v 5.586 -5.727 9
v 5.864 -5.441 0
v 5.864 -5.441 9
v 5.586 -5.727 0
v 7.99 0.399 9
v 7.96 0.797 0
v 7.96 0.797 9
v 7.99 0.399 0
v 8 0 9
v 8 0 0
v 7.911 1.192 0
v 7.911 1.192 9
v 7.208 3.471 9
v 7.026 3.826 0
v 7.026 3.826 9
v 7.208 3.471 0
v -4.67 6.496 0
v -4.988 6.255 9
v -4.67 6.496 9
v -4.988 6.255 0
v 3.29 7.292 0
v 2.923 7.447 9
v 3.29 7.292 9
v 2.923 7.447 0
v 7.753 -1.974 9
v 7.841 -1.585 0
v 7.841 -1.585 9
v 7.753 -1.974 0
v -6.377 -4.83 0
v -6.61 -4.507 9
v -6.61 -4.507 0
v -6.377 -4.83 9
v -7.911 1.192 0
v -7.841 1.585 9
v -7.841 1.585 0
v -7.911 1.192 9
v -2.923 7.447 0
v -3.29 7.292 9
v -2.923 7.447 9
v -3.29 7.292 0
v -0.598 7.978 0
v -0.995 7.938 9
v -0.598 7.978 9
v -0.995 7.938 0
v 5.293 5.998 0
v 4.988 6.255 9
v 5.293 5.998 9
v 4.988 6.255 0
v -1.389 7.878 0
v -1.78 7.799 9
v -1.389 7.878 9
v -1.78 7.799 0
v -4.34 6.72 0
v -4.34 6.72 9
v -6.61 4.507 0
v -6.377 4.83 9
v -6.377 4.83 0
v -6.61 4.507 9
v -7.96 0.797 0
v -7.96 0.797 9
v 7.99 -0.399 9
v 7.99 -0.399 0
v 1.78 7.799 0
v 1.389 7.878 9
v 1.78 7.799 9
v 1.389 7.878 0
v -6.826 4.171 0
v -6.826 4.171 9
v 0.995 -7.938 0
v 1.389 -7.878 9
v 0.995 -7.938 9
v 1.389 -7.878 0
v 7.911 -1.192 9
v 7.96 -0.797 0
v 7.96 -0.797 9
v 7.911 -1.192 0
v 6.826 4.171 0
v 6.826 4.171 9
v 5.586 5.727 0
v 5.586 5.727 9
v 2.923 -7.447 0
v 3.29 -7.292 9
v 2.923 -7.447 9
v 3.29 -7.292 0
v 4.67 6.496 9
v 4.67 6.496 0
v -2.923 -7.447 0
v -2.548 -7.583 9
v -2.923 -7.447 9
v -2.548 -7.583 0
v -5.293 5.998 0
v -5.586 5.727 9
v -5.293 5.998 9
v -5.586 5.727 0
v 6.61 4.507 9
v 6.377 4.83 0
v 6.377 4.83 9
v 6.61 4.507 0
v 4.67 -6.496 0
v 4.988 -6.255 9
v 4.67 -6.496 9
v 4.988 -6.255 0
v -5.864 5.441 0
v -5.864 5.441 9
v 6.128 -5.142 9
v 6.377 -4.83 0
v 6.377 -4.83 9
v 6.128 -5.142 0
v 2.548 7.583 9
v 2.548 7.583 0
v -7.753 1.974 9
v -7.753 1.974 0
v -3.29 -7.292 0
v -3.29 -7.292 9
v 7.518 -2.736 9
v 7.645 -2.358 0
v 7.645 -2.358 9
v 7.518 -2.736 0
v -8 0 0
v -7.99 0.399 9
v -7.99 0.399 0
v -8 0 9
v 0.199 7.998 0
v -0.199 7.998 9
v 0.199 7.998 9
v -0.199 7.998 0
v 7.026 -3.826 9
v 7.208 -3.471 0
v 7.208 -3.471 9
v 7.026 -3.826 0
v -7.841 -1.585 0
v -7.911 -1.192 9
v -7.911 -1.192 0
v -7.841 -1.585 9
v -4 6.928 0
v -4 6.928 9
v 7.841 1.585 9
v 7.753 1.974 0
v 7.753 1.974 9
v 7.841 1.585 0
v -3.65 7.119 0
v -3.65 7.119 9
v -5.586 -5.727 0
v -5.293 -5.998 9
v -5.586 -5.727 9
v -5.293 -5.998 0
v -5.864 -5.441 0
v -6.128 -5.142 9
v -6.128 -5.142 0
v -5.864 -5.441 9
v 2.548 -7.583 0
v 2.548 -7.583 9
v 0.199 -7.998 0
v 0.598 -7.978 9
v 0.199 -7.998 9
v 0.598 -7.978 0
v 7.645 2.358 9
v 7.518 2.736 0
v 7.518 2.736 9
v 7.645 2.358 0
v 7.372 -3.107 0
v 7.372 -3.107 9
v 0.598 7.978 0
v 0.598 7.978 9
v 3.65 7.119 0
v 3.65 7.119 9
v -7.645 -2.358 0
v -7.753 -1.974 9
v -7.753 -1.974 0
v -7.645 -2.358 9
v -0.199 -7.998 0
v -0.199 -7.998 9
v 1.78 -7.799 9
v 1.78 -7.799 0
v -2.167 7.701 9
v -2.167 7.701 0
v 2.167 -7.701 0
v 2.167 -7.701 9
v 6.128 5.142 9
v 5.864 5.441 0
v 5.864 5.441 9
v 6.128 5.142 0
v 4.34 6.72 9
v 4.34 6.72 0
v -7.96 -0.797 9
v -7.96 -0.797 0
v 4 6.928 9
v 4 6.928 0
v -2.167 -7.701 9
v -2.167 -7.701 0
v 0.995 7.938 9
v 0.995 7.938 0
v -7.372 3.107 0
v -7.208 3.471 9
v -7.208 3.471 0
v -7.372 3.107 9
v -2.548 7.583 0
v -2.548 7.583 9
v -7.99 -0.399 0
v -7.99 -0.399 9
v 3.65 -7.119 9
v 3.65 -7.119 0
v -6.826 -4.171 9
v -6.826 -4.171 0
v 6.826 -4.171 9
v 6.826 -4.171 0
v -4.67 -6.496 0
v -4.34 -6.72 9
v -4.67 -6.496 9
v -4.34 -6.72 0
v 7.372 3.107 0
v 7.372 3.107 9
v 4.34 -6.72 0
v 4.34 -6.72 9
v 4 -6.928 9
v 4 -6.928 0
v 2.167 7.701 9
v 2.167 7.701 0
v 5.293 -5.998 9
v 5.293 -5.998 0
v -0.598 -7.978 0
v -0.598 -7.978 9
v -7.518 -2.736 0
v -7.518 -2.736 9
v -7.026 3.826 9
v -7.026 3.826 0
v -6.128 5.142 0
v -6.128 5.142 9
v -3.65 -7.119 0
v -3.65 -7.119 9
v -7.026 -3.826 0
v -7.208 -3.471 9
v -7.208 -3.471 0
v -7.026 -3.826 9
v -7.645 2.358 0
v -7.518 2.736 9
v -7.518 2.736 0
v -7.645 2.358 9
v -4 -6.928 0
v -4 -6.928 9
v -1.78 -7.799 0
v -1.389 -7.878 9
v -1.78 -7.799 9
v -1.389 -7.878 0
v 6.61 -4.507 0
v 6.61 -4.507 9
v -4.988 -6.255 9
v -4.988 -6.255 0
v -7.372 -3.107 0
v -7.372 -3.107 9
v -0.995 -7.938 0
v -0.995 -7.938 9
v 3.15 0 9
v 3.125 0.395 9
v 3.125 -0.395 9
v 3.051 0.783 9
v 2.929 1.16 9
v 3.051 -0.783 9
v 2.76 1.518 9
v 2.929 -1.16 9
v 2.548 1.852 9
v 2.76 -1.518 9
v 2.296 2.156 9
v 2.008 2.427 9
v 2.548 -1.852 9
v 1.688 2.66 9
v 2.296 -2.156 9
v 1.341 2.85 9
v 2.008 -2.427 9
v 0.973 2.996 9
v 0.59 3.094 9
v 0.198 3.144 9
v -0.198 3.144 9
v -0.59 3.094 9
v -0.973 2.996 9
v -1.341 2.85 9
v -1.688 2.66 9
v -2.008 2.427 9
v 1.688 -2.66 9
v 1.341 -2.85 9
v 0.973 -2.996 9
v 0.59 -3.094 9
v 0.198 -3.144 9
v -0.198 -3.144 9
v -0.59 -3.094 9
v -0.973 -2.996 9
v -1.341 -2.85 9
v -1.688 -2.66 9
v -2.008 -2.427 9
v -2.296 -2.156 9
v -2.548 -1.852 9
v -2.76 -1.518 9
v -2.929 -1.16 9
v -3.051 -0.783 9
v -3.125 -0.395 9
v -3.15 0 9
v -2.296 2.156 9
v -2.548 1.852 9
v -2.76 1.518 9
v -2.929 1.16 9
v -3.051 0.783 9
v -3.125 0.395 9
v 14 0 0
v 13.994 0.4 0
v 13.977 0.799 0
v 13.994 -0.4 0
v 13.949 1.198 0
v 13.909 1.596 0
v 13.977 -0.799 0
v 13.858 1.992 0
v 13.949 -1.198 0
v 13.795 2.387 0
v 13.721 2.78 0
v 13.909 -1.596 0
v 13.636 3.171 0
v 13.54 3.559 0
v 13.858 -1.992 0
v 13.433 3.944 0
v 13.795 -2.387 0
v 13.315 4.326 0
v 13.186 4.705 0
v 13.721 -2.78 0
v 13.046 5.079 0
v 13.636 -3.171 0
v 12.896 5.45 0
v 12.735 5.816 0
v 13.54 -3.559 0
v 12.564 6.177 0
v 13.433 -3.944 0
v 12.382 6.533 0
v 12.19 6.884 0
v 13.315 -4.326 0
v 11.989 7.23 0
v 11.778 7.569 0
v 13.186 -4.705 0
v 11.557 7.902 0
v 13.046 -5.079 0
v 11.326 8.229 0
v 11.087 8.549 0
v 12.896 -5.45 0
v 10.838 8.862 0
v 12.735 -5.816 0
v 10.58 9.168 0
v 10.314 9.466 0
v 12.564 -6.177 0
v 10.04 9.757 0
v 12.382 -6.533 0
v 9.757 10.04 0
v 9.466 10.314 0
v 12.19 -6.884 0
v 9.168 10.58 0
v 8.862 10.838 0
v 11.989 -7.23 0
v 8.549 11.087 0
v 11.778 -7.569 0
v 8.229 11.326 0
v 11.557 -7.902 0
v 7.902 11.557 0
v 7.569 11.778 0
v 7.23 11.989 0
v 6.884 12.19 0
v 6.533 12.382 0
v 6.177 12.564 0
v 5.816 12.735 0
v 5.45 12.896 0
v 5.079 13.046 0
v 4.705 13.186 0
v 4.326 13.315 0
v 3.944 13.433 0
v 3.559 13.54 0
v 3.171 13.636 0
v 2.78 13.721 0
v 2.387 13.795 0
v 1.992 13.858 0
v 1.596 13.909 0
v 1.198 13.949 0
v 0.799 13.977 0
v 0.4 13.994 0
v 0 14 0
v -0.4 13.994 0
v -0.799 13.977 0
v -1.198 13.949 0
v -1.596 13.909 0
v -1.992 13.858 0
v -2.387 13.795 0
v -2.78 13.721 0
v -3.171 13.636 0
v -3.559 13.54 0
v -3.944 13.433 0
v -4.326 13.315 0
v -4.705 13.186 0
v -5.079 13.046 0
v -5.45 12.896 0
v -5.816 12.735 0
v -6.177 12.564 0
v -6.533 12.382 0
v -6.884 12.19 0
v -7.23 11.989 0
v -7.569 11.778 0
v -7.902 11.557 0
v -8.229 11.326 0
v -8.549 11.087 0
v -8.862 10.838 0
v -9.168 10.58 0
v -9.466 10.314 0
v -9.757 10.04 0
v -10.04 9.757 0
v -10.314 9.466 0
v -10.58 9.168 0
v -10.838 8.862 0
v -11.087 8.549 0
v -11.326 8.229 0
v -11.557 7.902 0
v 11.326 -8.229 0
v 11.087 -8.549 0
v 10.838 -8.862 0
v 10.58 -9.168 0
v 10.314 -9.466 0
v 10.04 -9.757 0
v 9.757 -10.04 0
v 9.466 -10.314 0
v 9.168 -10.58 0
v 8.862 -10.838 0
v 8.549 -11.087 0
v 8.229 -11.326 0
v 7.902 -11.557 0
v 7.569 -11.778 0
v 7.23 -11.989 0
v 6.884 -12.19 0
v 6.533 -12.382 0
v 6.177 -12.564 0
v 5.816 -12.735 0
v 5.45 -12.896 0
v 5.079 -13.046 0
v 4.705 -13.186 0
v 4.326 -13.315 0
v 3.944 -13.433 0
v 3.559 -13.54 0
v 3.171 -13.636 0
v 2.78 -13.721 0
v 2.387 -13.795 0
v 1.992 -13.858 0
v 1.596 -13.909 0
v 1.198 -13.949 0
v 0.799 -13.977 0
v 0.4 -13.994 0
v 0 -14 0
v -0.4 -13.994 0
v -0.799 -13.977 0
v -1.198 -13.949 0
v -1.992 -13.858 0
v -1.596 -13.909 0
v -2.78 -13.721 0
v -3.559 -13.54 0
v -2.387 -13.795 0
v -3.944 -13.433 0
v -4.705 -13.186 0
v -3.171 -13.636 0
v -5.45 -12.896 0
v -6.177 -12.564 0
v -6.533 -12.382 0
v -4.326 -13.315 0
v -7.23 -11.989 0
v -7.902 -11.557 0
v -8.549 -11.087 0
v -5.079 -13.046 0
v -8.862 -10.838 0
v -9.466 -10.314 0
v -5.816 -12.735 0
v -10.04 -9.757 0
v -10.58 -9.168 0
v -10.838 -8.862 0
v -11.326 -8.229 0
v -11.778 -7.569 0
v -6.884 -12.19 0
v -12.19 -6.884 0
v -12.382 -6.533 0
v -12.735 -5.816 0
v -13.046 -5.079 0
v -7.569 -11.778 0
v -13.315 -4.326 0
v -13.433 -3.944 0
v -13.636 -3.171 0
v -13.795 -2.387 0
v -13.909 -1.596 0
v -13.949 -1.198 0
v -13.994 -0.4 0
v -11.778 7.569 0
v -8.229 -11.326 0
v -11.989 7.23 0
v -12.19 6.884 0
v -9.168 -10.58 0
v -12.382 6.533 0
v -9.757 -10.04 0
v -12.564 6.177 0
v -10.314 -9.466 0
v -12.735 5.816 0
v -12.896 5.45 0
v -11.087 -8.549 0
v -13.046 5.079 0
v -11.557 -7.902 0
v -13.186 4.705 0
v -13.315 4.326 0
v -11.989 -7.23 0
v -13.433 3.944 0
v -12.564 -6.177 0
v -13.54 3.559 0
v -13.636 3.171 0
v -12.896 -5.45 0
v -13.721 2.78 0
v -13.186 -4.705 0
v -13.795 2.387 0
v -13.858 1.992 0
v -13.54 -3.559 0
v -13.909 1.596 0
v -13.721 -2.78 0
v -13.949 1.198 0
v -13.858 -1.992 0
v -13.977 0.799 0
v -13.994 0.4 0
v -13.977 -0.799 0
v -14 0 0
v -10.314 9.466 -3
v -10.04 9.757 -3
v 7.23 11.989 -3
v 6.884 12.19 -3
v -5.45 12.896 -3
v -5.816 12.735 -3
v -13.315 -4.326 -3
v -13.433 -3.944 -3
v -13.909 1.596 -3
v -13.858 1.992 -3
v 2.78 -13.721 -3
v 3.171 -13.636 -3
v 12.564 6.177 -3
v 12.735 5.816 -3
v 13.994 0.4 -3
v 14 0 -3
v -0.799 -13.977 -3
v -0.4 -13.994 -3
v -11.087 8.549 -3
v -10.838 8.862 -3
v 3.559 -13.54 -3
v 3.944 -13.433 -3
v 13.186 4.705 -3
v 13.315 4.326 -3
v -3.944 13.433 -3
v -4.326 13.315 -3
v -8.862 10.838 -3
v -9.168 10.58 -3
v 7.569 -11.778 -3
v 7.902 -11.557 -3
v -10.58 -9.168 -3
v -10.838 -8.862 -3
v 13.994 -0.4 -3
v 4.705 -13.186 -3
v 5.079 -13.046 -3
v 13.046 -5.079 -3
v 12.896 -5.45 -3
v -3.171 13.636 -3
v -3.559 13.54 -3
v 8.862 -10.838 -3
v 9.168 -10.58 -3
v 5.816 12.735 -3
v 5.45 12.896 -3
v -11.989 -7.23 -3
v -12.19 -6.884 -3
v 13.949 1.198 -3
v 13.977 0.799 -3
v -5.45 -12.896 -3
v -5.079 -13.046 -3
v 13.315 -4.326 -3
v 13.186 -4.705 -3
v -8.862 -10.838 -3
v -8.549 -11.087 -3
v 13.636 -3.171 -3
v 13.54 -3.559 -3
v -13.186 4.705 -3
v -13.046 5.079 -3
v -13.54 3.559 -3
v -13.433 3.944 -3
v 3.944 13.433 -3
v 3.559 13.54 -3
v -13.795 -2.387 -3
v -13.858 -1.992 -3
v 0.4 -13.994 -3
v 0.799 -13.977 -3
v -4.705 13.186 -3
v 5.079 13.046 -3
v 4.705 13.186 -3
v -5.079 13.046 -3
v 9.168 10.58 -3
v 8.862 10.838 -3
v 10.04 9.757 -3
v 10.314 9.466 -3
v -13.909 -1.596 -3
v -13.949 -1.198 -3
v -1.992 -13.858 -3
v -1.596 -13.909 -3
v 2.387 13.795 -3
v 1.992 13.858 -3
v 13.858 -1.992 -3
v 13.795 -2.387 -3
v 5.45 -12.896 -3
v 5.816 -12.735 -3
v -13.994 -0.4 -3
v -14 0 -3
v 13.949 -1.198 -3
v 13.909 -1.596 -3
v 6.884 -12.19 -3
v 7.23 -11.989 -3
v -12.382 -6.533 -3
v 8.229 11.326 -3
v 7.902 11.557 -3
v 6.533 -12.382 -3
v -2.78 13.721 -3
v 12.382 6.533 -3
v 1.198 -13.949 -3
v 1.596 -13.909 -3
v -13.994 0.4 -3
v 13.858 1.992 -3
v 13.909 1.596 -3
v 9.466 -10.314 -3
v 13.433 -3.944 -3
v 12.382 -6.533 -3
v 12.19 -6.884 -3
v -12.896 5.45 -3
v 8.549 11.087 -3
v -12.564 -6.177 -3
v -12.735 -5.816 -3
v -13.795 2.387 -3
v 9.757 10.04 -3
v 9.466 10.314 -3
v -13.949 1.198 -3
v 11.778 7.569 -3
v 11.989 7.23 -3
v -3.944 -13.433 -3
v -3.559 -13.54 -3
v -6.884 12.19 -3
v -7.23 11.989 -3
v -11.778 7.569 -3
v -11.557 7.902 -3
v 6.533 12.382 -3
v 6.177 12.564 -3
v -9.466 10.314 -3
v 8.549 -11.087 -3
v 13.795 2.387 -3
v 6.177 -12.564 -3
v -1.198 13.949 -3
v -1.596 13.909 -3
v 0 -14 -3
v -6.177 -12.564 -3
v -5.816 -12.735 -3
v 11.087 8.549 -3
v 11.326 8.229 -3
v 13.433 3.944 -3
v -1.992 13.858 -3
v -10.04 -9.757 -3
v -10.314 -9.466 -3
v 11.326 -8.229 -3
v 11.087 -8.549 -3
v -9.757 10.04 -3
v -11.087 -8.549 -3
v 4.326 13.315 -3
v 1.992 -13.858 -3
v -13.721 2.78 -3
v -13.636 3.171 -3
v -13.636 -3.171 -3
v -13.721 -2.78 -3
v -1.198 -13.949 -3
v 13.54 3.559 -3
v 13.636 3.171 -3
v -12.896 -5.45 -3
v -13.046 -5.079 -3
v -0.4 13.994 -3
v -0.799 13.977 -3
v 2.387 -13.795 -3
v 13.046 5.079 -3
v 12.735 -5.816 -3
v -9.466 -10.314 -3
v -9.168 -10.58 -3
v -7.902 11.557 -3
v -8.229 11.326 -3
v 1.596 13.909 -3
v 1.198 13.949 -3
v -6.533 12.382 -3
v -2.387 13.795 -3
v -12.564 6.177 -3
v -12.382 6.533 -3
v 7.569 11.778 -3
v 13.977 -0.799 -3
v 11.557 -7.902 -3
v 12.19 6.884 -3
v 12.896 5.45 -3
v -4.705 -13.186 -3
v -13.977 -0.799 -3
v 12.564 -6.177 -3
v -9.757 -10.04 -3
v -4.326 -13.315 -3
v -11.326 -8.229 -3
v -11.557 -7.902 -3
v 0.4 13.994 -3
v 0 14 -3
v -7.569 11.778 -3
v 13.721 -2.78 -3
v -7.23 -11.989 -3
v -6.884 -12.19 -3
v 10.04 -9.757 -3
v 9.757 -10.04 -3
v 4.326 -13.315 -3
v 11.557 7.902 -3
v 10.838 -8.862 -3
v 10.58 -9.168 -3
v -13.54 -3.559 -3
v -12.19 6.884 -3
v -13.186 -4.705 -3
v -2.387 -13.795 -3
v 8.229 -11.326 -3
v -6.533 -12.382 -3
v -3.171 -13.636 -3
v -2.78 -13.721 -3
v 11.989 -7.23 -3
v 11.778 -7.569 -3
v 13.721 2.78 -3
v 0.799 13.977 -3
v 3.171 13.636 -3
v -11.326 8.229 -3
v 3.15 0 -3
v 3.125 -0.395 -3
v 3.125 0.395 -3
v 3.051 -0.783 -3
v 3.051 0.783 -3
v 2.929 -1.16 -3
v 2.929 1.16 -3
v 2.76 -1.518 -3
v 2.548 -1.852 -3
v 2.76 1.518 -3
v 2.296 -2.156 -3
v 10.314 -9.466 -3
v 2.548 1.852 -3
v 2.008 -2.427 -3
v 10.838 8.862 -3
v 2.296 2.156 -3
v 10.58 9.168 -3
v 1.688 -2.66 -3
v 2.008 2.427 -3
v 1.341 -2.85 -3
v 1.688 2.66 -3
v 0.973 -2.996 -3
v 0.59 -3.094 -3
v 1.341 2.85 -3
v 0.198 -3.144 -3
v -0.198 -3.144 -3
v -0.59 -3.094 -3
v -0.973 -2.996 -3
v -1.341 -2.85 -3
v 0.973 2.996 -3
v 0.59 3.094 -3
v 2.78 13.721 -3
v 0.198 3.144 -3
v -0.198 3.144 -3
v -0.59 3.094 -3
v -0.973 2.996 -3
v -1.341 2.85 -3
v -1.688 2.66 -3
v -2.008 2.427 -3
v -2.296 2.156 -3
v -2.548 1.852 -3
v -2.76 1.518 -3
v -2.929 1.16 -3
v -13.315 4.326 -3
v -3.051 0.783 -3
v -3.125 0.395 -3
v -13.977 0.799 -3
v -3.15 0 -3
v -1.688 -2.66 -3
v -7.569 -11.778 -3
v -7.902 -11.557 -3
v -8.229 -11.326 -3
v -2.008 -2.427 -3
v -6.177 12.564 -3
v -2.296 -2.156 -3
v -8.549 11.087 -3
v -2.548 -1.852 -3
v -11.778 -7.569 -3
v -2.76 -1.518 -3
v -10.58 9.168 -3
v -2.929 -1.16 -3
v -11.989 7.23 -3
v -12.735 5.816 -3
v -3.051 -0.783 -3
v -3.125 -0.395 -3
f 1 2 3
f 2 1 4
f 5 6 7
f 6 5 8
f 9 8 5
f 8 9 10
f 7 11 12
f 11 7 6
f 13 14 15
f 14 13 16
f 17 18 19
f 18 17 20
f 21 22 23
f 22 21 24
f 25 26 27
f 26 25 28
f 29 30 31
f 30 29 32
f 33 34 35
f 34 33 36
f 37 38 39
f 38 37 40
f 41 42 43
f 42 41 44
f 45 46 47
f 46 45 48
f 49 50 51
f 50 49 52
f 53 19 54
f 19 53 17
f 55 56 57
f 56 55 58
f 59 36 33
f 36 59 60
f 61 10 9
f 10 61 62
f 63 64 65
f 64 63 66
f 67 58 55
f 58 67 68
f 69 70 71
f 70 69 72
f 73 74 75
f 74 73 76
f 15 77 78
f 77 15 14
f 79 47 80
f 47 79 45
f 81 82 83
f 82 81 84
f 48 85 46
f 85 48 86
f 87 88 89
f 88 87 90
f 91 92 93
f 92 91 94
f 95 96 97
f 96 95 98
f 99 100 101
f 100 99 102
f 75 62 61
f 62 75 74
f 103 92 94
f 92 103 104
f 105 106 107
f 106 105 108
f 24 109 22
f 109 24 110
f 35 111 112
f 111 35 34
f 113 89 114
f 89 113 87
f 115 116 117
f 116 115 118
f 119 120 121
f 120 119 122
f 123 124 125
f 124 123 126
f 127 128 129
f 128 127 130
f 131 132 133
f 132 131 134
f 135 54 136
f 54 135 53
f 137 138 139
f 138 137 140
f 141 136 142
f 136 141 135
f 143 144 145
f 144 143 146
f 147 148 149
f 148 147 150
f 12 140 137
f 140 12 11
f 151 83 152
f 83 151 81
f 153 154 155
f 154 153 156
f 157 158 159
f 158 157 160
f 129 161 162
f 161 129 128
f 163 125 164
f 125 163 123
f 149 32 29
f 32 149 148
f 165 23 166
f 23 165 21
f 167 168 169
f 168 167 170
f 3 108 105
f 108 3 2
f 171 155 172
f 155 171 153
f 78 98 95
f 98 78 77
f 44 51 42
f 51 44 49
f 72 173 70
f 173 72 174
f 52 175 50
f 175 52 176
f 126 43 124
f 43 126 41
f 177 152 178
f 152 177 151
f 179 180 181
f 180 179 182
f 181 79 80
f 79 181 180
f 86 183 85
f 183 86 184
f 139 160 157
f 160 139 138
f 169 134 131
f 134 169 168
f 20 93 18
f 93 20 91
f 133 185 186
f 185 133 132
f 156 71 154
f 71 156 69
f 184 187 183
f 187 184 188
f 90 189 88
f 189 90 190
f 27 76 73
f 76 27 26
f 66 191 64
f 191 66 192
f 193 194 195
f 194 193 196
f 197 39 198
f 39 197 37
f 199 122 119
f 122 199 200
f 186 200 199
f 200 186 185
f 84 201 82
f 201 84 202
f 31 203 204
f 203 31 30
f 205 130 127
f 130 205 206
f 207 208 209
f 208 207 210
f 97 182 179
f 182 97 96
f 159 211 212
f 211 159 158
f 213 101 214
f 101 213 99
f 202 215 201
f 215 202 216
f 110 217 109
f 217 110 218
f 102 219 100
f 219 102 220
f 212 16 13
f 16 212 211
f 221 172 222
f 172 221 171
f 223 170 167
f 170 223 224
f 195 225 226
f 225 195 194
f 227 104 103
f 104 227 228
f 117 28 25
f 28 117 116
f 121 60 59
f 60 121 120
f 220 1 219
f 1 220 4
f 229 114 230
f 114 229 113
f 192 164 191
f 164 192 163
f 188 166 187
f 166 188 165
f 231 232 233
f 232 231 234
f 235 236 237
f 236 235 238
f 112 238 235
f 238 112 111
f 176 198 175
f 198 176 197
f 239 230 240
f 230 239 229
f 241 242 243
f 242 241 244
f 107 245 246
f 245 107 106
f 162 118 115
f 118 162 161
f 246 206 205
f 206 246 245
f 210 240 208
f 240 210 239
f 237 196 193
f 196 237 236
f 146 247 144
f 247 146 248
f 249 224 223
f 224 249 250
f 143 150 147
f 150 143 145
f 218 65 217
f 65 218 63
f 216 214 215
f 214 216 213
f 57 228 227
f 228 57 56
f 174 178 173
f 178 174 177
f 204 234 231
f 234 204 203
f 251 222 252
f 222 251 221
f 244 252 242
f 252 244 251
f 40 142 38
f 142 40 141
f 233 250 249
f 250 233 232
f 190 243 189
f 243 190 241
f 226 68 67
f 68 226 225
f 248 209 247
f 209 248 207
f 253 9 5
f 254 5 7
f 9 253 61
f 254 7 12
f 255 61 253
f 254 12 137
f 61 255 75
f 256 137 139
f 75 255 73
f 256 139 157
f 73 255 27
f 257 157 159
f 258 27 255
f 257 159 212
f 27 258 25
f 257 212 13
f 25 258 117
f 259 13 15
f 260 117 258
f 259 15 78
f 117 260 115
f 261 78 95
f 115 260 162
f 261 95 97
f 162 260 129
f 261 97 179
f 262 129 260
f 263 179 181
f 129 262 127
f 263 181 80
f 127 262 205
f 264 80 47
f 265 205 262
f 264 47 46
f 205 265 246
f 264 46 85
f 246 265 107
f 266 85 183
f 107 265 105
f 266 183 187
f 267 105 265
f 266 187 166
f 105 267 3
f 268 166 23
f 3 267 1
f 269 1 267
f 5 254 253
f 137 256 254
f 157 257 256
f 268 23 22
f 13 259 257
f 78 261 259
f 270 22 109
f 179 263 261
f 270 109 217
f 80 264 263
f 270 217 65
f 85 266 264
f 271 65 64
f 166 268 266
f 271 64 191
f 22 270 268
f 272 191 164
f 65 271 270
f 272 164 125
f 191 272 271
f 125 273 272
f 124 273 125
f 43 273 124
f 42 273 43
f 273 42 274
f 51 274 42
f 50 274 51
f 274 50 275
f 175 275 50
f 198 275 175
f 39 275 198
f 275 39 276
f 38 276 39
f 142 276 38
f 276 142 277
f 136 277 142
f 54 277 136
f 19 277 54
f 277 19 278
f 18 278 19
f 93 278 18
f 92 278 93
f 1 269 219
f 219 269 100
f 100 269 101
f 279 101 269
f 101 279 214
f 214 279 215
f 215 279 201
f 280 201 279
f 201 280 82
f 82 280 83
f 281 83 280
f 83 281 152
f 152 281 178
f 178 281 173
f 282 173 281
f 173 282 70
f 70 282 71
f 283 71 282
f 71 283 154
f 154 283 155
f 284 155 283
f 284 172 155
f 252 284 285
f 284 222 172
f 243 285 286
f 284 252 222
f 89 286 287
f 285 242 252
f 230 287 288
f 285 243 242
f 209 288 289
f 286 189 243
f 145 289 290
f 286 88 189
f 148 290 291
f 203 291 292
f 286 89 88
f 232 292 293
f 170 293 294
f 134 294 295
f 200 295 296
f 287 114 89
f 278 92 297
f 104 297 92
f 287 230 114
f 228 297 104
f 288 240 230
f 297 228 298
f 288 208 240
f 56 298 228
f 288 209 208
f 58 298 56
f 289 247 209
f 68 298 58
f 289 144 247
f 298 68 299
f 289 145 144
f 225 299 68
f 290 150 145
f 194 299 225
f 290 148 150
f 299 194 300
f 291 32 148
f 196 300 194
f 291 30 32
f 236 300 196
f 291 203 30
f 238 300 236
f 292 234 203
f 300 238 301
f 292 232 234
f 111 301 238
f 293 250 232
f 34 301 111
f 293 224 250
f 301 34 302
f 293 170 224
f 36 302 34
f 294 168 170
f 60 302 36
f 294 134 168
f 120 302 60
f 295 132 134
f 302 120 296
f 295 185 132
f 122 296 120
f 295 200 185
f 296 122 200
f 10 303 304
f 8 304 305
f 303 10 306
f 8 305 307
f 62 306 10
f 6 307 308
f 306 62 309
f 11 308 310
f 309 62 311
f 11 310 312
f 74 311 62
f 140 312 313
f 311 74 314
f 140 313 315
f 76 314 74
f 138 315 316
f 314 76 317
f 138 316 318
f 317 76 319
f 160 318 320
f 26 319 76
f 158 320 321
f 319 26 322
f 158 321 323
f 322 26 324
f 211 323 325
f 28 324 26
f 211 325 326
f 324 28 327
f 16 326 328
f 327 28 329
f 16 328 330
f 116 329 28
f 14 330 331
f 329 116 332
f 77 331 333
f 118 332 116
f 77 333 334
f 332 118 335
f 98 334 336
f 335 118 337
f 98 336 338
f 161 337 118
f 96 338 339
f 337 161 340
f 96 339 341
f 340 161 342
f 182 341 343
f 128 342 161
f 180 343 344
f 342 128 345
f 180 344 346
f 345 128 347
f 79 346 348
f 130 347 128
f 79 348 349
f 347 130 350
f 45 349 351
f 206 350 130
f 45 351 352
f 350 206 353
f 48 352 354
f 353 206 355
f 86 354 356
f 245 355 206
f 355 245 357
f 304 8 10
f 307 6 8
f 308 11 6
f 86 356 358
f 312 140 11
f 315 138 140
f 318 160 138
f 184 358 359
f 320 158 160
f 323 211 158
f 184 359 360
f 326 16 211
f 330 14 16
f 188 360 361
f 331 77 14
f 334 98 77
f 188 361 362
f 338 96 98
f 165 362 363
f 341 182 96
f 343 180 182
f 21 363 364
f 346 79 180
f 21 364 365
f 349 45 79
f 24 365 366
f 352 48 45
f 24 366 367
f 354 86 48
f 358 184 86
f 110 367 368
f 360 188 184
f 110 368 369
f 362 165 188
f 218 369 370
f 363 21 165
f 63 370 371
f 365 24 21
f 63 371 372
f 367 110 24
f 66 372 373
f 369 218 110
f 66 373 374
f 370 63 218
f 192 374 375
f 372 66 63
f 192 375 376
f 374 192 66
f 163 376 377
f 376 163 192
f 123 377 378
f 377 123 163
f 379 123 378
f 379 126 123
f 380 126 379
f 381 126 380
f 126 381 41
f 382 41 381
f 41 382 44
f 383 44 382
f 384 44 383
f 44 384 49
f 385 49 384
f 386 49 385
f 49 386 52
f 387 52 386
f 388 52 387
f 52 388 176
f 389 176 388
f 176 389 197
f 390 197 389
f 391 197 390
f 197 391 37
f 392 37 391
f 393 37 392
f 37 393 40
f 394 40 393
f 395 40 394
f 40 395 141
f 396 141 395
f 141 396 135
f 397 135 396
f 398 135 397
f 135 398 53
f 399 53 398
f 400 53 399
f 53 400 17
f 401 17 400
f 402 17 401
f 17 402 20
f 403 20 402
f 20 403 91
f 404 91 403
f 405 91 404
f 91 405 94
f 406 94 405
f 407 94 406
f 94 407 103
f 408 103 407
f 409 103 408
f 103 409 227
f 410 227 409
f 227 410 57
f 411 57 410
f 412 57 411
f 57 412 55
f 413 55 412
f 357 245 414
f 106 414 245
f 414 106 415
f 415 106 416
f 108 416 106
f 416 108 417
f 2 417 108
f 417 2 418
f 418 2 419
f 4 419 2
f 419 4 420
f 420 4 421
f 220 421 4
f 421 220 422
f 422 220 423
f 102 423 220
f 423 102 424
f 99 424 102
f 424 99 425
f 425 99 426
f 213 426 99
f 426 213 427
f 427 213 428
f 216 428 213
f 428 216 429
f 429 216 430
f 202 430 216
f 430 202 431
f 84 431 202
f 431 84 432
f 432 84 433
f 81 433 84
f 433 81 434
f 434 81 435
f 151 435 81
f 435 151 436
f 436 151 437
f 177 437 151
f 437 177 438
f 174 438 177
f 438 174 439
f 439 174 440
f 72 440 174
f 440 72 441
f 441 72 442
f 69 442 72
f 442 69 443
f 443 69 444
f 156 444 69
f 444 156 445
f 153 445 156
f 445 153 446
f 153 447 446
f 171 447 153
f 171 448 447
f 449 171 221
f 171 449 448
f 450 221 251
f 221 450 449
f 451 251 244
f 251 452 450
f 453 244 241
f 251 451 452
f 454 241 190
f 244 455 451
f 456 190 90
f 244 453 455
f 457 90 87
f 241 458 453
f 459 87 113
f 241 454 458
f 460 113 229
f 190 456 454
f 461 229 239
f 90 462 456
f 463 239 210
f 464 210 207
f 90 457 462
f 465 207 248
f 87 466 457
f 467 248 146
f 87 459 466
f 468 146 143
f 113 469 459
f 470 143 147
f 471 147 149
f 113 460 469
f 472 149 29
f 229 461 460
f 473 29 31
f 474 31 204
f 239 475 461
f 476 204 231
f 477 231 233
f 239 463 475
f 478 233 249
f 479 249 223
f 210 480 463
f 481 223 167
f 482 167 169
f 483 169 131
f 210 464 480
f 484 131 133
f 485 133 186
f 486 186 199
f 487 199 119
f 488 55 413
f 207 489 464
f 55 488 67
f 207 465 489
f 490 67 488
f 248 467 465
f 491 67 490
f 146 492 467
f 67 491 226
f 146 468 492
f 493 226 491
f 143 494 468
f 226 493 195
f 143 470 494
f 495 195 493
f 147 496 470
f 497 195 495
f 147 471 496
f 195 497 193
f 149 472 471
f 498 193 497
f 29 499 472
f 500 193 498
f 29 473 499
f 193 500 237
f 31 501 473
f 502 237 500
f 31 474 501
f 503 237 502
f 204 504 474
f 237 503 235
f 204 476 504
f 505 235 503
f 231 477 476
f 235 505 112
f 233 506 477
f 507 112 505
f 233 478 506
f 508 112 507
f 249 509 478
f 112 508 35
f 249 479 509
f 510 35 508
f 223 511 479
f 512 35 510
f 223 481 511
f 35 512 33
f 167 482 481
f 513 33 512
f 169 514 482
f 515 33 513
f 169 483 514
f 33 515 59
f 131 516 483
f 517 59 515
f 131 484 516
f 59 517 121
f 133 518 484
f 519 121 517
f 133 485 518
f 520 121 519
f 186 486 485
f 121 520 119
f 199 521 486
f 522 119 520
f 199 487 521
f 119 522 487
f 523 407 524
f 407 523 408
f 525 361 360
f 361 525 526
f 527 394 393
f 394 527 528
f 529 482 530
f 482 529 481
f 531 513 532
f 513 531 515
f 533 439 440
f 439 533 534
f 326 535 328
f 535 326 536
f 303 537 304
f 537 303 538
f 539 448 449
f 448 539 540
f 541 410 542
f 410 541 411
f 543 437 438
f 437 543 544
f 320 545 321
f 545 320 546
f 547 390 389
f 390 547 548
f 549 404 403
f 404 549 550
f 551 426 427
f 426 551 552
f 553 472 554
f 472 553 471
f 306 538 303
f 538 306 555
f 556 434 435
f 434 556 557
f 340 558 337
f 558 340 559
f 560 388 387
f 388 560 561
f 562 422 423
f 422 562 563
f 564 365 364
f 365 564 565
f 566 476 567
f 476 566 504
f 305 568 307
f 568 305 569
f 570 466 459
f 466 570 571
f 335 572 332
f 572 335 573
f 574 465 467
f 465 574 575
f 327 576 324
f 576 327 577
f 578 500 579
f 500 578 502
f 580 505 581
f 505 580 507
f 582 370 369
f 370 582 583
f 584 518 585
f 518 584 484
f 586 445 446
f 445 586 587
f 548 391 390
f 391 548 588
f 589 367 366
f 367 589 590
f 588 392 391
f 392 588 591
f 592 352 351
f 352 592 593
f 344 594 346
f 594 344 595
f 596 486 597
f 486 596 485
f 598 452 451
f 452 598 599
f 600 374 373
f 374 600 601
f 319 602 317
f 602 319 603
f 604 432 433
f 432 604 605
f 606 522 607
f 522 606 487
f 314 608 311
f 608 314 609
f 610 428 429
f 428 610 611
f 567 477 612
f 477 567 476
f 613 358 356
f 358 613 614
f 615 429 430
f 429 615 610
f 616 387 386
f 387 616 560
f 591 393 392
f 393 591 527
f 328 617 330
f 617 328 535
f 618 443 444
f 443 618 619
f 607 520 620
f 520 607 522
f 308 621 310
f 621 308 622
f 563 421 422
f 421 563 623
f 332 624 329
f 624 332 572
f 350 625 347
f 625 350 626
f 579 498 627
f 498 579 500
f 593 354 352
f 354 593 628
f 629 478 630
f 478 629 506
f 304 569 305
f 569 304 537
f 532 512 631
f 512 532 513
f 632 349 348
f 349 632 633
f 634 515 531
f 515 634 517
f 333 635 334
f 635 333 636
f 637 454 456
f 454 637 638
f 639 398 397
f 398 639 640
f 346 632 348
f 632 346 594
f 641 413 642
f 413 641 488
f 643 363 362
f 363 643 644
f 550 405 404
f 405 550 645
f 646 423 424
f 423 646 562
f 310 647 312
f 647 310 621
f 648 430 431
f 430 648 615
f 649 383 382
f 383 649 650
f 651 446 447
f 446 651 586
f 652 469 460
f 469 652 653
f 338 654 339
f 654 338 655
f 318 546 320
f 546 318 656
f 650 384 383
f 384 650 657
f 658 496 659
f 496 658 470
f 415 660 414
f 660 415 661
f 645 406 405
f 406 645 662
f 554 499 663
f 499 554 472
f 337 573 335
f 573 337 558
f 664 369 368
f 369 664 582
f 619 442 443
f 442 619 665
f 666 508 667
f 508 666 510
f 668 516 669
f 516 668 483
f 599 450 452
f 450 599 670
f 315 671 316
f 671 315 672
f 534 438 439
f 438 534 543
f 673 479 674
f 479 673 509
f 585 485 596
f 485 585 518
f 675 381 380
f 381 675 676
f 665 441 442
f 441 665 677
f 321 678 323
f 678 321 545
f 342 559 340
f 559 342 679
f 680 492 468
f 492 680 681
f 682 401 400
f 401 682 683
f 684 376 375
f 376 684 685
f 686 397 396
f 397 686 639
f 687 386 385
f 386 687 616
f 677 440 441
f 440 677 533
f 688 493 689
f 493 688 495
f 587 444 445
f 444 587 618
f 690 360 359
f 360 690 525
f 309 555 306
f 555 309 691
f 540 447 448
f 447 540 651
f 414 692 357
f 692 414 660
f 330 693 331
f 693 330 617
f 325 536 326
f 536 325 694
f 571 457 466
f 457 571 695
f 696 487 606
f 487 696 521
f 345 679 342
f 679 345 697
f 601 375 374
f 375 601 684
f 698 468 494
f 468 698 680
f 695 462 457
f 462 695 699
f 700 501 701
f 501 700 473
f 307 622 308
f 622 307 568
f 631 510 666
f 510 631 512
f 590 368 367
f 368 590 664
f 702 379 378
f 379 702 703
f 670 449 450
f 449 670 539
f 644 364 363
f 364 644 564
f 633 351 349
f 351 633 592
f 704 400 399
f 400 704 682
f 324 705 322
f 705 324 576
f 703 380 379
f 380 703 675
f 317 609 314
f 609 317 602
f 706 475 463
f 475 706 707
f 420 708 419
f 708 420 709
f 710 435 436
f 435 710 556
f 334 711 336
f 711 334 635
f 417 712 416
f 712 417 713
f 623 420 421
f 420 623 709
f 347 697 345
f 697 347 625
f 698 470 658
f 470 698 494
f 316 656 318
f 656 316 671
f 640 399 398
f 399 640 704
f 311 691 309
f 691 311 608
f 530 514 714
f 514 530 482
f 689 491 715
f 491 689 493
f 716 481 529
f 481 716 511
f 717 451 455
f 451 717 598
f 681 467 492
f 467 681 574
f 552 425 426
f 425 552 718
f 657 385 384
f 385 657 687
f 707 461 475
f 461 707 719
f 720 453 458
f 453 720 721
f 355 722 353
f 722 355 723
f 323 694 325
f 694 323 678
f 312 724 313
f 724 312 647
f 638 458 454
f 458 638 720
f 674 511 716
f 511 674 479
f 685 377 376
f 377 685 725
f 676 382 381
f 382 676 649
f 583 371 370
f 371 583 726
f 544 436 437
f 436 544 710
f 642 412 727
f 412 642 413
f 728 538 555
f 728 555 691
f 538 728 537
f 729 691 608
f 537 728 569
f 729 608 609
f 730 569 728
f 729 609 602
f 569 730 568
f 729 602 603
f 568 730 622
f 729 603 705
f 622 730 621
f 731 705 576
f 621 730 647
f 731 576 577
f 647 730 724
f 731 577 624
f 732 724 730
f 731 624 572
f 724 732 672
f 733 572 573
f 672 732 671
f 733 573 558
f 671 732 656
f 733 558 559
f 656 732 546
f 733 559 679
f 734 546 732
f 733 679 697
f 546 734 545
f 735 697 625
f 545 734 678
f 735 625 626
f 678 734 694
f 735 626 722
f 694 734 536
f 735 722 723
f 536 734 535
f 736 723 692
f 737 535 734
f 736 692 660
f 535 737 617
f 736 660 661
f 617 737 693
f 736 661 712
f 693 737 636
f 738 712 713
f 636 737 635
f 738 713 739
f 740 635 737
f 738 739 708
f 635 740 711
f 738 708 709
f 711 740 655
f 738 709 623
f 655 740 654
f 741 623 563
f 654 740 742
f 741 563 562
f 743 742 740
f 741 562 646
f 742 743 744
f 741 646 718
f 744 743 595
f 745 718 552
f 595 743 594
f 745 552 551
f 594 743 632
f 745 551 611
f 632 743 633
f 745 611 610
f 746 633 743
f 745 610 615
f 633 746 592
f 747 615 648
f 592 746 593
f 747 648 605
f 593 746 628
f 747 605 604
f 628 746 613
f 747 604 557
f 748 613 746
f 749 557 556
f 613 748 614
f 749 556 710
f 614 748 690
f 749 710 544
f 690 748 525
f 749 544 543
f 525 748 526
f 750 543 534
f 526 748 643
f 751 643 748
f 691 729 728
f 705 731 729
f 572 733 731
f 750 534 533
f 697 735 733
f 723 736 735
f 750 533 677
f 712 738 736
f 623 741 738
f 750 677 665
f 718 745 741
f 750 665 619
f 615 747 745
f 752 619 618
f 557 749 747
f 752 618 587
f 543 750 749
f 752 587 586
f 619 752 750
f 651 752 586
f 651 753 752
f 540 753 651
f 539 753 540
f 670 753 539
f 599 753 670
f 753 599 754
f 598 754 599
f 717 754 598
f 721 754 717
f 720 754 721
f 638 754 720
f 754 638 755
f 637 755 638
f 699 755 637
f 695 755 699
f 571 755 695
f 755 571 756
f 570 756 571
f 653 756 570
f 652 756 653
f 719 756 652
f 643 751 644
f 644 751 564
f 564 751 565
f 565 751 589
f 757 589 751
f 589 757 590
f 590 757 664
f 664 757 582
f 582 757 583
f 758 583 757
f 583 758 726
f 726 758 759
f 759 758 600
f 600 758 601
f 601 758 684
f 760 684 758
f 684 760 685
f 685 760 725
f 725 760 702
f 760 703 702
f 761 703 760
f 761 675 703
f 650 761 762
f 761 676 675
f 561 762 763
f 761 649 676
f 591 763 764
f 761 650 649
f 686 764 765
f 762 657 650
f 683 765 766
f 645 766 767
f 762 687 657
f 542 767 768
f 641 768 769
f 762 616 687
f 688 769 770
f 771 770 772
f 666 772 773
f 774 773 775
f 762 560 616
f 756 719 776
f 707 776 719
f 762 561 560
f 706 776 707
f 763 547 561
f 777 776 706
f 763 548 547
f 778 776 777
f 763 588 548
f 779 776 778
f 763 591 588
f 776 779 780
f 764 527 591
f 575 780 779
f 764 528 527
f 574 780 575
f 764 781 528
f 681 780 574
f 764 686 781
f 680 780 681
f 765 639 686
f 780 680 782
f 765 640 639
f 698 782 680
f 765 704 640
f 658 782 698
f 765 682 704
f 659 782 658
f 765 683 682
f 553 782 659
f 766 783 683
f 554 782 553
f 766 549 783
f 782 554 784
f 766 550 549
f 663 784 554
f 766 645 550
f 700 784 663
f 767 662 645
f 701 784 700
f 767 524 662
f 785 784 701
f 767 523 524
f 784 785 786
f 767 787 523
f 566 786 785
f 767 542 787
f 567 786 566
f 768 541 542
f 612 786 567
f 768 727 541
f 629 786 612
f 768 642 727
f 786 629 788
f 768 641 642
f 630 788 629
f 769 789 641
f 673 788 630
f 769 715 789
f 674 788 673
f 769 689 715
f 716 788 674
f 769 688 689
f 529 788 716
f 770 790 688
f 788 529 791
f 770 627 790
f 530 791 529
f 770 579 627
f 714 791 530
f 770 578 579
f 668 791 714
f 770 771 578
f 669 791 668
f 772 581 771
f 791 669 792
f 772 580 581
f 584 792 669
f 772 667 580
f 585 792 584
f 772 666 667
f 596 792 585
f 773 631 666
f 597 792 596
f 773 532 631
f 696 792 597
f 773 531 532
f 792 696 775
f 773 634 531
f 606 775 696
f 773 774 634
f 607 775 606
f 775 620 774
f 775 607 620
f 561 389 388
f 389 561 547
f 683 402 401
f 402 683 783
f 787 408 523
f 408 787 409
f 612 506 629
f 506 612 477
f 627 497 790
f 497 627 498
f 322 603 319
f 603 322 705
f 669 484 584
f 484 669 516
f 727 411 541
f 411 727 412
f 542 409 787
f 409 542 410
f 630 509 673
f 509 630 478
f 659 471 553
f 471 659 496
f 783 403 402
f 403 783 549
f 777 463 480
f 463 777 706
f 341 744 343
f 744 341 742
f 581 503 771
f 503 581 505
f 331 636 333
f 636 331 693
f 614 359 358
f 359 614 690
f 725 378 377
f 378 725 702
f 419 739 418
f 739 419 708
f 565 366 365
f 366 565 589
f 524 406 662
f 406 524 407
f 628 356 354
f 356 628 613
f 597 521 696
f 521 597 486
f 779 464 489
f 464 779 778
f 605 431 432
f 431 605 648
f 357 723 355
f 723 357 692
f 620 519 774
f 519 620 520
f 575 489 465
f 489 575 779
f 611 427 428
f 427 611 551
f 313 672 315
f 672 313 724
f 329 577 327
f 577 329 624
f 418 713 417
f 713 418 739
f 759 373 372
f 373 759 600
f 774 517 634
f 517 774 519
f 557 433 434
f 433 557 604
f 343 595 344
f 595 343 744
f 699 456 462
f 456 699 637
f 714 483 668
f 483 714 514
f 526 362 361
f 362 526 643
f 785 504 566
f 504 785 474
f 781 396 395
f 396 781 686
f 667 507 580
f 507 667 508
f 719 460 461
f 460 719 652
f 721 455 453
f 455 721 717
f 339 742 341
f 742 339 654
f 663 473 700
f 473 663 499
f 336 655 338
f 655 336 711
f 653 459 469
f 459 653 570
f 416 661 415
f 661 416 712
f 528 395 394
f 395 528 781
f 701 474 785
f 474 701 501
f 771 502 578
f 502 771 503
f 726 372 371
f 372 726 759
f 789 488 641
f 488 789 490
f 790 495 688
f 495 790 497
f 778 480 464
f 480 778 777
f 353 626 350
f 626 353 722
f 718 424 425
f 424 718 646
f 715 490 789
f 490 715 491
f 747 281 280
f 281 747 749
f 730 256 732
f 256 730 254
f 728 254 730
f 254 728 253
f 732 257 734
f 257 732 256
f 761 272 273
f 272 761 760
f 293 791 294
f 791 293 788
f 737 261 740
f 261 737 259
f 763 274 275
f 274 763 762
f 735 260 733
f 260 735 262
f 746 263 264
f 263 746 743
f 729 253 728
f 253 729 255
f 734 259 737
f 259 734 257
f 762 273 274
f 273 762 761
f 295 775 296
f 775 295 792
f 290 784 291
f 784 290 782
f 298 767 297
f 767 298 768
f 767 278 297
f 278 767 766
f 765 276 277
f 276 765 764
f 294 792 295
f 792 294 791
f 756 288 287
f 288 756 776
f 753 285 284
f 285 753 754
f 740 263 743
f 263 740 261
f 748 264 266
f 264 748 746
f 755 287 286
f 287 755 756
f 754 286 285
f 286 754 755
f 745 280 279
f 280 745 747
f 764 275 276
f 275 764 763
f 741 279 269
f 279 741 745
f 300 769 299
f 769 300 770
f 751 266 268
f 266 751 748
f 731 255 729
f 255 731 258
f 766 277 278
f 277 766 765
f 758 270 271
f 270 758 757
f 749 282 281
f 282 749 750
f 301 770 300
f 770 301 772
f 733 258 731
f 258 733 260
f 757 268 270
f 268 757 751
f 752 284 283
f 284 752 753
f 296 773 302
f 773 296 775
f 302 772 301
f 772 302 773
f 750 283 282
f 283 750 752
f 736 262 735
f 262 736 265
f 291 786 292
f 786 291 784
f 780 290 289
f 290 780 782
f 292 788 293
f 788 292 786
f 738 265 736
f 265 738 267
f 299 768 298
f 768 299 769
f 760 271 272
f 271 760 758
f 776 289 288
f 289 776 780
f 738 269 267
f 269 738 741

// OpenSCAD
$fa = 1;
$fs = 0.4;

CLEARANCE = 0.3;

H = 9;
OUT_D = 16;
IN_D = 6;

difference() {
    union() {
        cylinder(d=OUT_D, h=H);
        translate([0, 0, -3]) cylinder(d=28, h=3);
    }   
    translate([0, 0, -4]) cylinder(d=IN_D+CLEARANCE, h=H*2);
}
